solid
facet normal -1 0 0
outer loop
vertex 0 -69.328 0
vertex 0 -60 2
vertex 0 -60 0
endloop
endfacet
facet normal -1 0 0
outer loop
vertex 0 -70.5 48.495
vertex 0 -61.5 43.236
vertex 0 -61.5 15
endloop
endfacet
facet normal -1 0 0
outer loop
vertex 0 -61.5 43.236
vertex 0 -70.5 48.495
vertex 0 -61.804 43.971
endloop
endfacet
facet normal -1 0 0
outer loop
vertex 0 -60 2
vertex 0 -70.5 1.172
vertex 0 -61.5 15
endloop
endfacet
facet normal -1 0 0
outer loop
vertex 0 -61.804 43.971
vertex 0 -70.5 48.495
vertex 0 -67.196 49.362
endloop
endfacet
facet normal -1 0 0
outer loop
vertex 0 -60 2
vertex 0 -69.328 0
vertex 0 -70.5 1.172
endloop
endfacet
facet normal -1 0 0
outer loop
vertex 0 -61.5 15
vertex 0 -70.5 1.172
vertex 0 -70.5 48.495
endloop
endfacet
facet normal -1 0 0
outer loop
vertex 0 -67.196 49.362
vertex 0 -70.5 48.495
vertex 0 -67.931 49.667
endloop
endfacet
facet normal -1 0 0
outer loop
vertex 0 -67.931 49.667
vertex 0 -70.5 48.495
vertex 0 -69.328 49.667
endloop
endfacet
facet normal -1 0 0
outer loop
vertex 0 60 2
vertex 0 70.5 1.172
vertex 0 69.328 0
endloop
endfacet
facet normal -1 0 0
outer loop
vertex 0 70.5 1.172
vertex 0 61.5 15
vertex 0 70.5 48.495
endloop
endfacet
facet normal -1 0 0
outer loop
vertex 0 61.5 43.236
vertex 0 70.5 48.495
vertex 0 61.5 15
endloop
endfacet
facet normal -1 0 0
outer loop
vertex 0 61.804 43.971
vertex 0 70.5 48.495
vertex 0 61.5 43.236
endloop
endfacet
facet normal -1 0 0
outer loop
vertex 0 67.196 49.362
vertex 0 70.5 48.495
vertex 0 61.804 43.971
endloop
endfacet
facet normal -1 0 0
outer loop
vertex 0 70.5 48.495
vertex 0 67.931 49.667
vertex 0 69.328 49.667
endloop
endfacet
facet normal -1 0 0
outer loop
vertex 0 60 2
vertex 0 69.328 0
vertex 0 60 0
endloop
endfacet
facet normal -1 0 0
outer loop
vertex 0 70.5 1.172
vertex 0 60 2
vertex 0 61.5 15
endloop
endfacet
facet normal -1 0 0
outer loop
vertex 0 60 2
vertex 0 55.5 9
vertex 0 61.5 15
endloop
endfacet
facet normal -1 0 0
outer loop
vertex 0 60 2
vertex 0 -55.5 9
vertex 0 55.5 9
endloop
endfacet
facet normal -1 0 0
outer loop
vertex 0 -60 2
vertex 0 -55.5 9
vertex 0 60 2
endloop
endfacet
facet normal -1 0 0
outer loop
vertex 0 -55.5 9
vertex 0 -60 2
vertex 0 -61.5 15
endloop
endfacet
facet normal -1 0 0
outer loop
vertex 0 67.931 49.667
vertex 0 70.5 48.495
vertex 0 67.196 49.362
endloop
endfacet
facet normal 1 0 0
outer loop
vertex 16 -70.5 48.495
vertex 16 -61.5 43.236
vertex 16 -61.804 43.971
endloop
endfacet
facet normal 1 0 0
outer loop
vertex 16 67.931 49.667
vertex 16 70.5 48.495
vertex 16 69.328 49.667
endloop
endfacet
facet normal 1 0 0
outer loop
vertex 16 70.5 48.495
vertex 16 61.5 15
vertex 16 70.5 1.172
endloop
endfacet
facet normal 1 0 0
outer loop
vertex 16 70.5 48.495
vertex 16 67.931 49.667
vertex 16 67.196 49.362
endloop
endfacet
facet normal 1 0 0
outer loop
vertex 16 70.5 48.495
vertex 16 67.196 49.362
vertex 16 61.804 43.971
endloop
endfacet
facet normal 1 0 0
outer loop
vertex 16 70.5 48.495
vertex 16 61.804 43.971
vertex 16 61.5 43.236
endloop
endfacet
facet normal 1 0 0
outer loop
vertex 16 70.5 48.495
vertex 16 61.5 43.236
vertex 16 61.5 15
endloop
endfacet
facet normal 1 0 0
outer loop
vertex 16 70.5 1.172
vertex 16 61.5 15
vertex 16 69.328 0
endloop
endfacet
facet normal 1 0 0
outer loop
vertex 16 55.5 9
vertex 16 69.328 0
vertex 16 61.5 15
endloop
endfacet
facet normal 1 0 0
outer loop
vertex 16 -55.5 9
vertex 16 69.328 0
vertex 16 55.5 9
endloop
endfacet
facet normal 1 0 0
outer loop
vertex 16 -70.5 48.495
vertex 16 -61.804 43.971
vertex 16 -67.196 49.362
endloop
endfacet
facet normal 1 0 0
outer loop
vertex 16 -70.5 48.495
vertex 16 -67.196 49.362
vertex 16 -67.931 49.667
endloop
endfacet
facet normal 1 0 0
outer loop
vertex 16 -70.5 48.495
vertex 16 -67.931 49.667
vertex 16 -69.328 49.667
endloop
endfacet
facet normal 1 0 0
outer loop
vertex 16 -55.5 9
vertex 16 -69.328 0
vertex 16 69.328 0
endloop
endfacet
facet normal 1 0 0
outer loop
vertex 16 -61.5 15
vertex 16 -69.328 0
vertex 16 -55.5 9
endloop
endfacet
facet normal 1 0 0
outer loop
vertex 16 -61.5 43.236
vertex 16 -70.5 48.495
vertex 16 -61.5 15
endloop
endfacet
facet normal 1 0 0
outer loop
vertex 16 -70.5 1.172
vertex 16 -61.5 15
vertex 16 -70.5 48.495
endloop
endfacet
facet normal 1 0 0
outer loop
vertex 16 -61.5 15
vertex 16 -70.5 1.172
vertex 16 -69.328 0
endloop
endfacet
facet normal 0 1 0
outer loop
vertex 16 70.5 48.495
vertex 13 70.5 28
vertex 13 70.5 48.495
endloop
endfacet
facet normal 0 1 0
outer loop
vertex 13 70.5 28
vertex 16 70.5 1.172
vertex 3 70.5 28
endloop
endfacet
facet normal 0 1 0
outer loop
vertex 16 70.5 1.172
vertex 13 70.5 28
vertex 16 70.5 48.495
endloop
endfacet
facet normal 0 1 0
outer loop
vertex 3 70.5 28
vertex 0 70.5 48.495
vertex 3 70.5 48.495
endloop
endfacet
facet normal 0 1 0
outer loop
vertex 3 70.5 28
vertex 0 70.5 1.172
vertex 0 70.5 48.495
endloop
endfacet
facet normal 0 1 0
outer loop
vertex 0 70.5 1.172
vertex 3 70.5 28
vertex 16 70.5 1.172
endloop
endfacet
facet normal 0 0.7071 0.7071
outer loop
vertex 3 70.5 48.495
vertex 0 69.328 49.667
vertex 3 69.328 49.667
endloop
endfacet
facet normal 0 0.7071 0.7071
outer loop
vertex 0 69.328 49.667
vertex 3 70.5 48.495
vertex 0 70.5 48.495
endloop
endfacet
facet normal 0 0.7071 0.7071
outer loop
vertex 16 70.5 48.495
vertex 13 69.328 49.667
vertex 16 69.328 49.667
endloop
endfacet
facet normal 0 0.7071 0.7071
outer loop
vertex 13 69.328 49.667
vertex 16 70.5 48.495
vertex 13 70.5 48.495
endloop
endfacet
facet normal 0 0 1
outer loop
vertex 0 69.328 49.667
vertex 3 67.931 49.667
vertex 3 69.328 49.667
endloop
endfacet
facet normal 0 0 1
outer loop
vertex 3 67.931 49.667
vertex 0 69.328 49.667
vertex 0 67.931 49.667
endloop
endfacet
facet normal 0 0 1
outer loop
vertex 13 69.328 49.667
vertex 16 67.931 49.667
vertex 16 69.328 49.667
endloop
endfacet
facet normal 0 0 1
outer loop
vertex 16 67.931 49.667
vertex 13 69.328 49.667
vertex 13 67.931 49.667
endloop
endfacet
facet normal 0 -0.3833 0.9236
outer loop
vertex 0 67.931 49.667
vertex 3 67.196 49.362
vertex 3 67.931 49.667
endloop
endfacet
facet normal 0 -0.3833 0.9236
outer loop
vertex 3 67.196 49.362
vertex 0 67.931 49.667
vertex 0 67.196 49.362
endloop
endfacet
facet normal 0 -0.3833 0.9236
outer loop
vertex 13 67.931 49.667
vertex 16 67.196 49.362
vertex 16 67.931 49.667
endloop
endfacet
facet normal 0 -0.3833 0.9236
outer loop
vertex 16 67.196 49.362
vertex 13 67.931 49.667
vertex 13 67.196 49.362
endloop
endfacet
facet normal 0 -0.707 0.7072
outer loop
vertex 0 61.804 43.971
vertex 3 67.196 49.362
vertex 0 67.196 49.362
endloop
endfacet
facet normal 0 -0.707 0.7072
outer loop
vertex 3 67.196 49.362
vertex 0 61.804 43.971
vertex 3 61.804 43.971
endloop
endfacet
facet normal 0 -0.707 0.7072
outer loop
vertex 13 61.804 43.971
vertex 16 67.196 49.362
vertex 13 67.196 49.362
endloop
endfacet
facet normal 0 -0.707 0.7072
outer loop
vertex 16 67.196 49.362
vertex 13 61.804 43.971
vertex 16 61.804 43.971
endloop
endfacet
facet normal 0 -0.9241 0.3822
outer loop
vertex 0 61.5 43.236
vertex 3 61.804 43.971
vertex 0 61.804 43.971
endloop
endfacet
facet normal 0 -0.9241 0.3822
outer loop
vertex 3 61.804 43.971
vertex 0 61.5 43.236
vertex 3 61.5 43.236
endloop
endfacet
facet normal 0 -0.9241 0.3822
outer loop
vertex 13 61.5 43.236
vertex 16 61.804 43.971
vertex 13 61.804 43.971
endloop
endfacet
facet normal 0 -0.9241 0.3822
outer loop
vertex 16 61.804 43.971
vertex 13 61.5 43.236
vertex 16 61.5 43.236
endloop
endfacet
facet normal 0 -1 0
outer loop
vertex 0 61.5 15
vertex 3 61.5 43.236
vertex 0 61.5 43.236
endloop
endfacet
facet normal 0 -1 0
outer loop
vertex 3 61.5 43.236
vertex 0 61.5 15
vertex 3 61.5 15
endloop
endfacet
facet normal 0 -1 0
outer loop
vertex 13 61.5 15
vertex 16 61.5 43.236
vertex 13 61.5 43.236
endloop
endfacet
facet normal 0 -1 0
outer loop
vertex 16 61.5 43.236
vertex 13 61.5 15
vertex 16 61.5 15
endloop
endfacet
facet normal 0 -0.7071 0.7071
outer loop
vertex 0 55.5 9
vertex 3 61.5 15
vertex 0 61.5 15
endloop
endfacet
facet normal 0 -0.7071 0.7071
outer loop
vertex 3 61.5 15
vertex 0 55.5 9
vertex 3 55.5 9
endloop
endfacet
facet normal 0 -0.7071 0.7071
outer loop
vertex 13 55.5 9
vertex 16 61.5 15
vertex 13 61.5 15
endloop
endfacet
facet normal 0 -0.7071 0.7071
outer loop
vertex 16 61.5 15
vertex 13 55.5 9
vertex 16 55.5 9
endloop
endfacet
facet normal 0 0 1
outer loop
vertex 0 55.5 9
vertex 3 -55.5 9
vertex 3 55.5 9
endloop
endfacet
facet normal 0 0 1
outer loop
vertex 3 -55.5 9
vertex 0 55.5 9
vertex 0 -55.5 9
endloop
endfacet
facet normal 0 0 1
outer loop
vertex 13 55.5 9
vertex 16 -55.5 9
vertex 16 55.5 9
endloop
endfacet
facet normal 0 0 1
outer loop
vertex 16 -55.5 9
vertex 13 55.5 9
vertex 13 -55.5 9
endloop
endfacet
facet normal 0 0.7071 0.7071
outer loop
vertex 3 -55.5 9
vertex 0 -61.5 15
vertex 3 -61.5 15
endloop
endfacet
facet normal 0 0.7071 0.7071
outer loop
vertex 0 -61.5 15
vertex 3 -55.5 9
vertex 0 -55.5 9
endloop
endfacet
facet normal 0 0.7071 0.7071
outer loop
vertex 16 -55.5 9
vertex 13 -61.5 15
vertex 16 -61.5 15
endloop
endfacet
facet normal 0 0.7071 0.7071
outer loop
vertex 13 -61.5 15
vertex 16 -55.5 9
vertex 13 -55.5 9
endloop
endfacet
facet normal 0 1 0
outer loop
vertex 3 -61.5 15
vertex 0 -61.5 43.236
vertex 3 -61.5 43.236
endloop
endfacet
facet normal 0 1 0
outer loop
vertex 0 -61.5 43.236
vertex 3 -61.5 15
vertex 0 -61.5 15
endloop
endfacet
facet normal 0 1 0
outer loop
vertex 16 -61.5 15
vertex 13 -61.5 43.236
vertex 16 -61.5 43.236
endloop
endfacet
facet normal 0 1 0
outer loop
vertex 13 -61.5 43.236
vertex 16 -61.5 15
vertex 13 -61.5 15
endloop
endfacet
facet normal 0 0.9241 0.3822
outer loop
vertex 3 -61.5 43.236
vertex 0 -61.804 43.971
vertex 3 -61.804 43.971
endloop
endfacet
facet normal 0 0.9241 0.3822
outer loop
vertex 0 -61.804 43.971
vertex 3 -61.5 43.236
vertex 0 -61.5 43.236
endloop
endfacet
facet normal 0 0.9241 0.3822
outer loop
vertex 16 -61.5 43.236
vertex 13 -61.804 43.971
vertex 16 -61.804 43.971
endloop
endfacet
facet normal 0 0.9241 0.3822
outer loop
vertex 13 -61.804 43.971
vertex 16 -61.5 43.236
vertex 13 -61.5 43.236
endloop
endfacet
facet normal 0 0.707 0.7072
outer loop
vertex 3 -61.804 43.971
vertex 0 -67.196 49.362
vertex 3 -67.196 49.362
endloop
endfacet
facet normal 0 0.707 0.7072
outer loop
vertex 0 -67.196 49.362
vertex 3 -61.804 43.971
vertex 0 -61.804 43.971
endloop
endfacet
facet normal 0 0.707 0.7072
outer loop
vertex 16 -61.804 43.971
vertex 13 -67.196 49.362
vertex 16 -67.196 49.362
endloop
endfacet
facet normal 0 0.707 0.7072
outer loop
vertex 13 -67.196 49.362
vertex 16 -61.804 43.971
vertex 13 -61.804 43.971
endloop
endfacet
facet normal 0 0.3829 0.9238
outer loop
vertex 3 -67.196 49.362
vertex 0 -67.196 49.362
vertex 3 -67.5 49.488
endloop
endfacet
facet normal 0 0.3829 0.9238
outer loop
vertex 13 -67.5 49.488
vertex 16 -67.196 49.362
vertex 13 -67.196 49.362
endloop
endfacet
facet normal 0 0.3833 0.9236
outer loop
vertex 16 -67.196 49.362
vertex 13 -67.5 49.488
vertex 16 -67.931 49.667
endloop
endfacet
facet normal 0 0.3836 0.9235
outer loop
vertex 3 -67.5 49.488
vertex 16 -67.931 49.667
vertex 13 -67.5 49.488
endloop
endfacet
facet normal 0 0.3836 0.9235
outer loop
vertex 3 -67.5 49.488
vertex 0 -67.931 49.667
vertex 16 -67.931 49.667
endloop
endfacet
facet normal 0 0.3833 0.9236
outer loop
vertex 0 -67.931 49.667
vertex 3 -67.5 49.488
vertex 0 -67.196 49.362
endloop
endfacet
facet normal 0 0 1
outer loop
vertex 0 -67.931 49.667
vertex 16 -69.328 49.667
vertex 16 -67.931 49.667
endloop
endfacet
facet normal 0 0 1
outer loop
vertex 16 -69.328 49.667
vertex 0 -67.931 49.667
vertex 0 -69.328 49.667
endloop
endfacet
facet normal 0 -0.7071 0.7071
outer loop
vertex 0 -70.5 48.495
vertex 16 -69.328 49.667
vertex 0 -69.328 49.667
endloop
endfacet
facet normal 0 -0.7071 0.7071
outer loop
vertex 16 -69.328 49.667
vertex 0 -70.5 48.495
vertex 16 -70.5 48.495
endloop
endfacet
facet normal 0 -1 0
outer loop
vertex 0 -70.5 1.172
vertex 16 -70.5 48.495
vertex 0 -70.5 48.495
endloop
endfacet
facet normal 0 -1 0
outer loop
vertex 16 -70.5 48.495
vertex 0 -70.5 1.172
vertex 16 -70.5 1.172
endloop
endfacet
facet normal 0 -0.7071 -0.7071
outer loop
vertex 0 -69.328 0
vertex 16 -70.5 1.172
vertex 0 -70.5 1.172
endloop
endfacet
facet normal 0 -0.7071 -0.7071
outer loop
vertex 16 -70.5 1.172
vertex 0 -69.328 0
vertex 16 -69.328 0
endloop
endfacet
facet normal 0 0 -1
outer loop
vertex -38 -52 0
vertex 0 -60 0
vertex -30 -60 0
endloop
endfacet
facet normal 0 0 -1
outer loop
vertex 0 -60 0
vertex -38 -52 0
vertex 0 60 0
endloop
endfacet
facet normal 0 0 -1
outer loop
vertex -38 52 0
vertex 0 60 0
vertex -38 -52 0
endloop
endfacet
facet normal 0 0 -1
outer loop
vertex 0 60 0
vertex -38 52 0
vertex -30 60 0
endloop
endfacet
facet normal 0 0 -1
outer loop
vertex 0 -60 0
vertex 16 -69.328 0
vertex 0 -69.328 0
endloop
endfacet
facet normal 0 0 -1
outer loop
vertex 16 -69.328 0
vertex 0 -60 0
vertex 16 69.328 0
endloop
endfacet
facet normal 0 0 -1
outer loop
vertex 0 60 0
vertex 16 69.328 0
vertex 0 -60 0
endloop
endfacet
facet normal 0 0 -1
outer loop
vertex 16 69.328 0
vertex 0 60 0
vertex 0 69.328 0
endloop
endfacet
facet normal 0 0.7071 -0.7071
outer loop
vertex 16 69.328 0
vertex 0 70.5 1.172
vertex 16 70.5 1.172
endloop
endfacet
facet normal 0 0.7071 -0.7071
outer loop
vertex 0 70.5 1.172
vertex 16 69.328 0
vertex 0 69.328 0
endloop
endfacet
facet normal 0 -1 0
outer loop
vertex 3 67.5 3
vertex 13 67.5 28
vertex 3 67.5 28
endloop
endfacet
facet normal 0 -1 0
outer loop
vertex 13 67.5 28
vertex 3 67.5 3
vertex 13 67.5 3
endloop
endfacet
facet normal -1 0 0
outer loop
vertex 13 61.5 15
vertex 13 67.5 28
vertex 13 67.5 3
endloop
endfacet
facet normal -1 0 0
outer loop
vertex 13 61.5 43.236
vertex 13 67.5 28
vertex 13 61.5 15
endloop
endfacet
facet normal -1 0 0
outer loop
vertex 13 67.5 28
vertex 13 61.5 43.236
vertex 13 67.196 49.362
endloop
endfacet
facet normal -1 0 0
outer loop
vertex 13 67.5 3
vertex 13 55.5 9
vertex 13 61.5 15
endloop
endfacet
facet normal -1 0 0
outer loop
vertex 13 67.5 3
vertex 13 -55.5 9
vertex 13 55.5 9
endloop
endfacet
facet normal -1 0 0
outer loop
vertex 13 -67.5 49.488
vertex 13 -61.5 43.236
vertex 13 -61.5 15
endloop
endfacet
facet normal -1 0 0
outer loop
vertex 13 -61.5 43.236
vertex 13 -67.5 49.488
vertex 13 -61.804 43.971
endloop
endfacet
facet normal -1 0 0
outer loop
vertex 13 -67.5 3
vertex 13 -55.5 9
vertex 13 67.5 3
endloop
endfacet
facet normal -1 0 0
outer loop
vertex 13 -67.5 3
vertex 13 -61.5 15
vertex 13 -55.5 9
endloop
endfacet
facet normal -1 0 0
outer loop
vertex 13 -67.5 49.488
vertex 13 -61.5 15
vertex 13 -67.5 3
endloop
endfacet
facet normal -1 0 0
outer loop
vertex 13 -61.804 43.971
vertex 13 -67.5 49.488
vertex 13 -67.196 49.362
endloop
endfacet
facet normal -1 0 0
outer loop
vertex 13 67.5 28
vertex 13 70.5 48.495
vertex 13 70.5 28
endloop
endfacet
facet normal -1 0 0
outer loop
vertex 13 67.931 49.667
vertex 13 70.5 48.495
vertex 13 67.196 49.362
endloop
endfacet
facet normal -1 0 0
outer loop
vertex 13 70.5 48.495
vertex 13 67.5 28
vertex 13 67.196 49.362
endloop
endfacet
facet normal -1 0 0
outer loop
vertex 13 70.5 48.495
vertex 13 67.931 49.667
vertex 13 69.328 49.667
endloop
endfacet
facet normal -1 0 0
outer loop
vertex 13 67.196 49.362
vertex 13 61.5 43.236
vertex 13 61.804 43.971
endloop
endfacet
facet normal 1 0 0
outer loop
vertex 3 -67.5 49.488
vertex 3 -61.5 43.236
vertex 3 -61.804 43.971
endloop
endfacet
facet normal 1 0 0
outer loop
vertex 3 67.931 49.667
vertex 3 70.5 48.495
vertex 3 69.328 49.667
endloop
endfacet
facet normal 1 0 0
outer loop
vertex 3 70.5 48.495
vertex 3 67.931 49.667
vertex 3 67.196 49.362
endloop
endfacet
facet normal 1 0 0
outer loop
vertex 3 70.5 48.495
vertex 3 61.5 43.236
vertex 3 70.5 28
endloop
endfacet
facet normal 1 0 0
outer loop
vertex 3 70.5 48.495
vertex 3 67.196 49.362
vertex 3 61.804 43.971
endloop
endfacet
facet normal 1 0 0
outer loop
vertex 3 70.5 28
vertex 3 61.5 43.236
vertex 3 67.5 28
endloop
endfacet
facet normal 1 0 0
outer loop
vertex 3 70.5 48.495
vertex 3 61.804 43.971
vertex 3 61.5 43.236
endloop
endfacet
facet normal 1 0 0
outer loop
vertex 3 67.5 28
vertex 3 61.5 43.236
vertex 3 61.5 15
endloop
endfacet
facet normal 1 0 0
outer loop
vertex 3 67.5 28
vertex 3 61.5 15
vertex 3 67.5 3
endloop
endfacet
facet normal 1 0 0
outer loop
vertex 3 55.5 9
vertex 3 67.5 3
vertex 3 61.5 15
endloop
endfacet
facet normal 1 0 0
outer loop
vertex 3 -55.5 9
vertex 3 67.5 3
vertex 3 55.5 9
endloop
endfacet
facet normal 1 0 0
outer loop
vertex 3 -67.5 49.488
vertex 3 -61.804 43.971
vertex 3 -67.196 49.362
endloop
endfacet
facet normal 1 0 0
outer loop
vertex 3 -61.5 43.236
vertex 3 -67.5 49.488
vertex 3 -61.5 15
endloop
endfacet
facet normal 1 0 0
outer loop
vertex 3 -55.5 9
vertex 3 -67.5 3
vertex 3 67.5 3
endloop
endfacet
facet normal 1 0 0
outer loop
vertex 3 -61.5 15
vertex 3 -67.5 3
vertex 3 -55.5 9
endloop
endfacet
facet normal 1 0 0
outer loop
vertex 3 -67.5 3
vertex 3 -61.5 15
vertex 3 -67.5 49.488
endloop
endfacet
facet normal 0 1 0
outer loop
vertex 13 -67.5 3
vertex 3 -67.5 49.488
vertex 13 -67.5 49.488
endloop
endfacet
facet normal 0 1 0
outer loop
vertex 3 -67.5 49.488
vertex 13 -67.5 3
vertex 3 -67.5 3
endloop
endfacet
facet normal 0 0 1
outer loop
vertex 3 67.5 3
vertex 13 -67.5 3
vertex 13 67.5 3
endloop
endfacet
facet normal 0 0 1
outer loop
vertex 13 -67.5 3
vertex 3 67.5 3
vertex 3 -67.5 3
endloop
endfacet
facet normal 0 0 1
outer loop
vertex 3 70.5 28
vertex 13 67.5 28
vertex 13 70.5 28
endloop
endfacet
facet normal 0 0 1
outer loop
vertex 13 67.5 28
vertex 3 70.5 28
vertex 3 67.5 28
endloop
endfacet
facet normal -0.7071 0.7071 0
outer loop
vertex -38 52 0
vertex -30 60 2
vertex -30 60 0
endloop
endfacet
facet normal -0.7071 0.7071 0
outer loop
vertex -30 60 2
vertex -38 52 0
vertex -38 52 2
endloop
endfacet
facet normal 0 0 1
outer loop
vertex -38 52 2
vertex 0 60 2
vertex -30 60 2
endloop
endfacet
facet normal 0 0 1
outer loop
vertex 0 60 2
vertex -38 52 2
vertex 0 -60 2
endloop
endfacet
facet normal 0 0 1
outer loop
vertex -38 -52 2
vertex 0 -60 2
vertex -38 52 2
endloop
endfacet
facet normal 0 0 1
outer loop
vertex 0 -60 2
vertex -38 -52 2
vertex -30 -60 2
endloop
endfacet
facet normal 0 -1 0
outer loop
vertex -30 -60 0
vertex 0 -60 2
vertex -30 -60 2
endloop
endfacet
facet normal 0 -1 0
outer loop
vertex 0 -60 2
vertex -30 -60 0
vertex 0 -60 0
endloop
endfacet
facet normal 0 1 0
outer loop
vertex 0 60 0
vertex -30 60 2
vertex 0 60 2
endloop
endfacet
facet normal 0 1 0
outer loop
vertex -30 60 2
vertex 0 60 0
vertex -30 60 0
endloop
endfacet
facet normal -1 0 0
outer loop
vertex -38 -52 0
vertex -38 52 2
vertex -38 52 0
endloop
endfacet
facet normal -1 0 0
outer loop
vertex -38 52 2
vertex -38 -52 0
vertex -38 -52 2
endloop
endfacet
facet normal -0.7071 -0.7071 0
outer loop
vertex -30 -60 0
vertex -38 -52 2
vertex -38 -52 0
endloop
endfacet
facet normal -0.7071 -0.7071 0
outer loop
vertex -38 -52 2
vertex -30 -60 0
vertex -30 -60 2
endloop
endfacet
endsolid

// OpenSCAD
// CD tray mount for cell phone

// Author: Philippe Vanhaesendonck
// License: CC BY-NC-SA
// Based on original work from:
//  http://www.thingiverse.com/thing:644402


// OpenSCAD stuff
delta       = 0.1;    // Small delta used for differences
offset      = 1.0;    // Bigger offset
$fa         = 3;      // Min segment angle for facets
$fs         = 0.5;    // Min segment size

// Cell phone size (Nexus 4)
g_l = 135;            // Length
g_h = 70.0 * 2 / 3;   // Height (We take 2/3rd)
g_w = 10;             // Width
g_u = 25;             // Heigth of the USB hole

h_w = 3;              // Wall thickness
h_b = 6;              // 'Border' size

// Holder design -- polygon points
p_holder = [
  [-g_l / 2 - h_w    , 0],
  [ g_l / 2 + h_w    , 0],
  [ g_l / 2 + h_w    , g_h + h_w],
  [ g_l / 2          , g_h + h_w],
  [ g_l / 2 - h_b    , g_h + h_w - h_b],
  [ g_l / 2 - h_b    , 2 * h_b + h_w],
  [ g_l / 2 - 2 * h_b, h_b + h_w],
  [-g_l / 2 + 2 * h_b, h_b + h_w],
  [-g_l / 2 + h_b    , 2 * h_b + h_w],
  [-g_l / 2 + h_b    , g_h + h_w - h_b],
  [-g_l / 2          , g_h + h_w],
  [-g_l / 2 - h_w    , g_h + h_w]  
];

// CD insert size
cd_l = 120;           // Length (width)
cd_h = 38;            // Height (depth)
cd_c = 8;             // Chamfer (at the end)
cd_w = 2;             // Width

// Polygon for the insert
p_cd = [
  [0           , -cd_l / 2],
  [-cd_h + cd_c, -cd_l / 2],
  [-cd_h       , -cd_l / 2 + cd_c],
  [-cd_h       ,  cd_l / 2 - cd_c],
  [-cd_h + cd_c,  cd_l / 2],
  [0           ,  cd_l / 2]  
];

// Draw holder
module holder() {
  difference() {
    // Holder 'volume'
    linear_extrude(height = g_w + 2 * h_w, convexity = 5)
      offset(delta=2, chamfer=true) 
        offset(delta=-2) 
          polygon(points = p_holder,
            paths = [
              [0, 1, 2, 3, 4, 5, 6, 7, 8, 9, 10, 11]
            ]);
    // Phone 'pocket'
    translate([-g_l / 2, h_w, h_w])
      cube([g_l, g_h, g_w]);
    // USB clearance
    translate([g_l / 2 - delta, h_w + g_u, h_w])
      cube([h_w + delta * 2, g_h, g_w]);
  }
}


// Draw insert
module cd_insert() {
  linear_extrude(height = cd_w, convexity = 3)
    polygon(points = p_cd,
      paths = [
        [0, 1, 2, 3, 4, 5, 6]
      ]);
}


// Draw all parts
rotate([90, 0, 90])
  holder();
cd_insert();
